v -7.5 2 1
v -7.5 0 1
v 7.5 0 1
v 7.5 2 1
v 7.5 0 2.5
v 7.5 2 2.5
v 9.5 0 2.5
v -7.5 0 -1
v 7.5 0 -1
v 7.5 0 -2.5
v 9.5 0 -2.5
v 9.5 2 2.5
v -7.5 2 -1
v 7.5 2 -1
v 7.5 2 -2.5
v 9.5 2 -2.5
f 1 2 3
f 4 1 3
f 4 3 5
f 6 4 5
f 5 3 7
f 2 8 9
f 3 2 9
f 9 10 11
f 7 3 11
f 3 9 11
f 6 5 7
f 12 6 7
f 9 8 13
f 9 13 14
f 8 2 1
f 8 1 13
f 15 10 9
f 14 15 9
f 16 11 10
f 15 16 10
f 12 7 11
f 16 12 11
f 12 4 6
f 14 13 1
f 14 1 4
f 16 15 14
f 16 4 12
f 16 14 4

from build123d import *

# Parameters (mm, degrees)
SKETCH1_W           = 15
SKETCH1_H           = 2
BOSS_EXTRUDE1_DEPTH = 2


with BuildPart() as part:
    # Sketch1 → Boss-Extrude1 (new body)
    with BuildSketch(Plane(origin=(0, 0, 0), x_dir=(1, 0, 0), z_dir=(0, 1, 0))):
        Rectangle(SKETCH1_W, SKETCH1_H)
        Polygon((7.5, 1), (7.5, -1), (7.5, -2.5), (9.5, -2.5), (9.5, 2.5), (7.5, 2.5), align=None)
    extrude(amount=BOSS_EXTRUDE1_DEPTH)


solid = part.part
